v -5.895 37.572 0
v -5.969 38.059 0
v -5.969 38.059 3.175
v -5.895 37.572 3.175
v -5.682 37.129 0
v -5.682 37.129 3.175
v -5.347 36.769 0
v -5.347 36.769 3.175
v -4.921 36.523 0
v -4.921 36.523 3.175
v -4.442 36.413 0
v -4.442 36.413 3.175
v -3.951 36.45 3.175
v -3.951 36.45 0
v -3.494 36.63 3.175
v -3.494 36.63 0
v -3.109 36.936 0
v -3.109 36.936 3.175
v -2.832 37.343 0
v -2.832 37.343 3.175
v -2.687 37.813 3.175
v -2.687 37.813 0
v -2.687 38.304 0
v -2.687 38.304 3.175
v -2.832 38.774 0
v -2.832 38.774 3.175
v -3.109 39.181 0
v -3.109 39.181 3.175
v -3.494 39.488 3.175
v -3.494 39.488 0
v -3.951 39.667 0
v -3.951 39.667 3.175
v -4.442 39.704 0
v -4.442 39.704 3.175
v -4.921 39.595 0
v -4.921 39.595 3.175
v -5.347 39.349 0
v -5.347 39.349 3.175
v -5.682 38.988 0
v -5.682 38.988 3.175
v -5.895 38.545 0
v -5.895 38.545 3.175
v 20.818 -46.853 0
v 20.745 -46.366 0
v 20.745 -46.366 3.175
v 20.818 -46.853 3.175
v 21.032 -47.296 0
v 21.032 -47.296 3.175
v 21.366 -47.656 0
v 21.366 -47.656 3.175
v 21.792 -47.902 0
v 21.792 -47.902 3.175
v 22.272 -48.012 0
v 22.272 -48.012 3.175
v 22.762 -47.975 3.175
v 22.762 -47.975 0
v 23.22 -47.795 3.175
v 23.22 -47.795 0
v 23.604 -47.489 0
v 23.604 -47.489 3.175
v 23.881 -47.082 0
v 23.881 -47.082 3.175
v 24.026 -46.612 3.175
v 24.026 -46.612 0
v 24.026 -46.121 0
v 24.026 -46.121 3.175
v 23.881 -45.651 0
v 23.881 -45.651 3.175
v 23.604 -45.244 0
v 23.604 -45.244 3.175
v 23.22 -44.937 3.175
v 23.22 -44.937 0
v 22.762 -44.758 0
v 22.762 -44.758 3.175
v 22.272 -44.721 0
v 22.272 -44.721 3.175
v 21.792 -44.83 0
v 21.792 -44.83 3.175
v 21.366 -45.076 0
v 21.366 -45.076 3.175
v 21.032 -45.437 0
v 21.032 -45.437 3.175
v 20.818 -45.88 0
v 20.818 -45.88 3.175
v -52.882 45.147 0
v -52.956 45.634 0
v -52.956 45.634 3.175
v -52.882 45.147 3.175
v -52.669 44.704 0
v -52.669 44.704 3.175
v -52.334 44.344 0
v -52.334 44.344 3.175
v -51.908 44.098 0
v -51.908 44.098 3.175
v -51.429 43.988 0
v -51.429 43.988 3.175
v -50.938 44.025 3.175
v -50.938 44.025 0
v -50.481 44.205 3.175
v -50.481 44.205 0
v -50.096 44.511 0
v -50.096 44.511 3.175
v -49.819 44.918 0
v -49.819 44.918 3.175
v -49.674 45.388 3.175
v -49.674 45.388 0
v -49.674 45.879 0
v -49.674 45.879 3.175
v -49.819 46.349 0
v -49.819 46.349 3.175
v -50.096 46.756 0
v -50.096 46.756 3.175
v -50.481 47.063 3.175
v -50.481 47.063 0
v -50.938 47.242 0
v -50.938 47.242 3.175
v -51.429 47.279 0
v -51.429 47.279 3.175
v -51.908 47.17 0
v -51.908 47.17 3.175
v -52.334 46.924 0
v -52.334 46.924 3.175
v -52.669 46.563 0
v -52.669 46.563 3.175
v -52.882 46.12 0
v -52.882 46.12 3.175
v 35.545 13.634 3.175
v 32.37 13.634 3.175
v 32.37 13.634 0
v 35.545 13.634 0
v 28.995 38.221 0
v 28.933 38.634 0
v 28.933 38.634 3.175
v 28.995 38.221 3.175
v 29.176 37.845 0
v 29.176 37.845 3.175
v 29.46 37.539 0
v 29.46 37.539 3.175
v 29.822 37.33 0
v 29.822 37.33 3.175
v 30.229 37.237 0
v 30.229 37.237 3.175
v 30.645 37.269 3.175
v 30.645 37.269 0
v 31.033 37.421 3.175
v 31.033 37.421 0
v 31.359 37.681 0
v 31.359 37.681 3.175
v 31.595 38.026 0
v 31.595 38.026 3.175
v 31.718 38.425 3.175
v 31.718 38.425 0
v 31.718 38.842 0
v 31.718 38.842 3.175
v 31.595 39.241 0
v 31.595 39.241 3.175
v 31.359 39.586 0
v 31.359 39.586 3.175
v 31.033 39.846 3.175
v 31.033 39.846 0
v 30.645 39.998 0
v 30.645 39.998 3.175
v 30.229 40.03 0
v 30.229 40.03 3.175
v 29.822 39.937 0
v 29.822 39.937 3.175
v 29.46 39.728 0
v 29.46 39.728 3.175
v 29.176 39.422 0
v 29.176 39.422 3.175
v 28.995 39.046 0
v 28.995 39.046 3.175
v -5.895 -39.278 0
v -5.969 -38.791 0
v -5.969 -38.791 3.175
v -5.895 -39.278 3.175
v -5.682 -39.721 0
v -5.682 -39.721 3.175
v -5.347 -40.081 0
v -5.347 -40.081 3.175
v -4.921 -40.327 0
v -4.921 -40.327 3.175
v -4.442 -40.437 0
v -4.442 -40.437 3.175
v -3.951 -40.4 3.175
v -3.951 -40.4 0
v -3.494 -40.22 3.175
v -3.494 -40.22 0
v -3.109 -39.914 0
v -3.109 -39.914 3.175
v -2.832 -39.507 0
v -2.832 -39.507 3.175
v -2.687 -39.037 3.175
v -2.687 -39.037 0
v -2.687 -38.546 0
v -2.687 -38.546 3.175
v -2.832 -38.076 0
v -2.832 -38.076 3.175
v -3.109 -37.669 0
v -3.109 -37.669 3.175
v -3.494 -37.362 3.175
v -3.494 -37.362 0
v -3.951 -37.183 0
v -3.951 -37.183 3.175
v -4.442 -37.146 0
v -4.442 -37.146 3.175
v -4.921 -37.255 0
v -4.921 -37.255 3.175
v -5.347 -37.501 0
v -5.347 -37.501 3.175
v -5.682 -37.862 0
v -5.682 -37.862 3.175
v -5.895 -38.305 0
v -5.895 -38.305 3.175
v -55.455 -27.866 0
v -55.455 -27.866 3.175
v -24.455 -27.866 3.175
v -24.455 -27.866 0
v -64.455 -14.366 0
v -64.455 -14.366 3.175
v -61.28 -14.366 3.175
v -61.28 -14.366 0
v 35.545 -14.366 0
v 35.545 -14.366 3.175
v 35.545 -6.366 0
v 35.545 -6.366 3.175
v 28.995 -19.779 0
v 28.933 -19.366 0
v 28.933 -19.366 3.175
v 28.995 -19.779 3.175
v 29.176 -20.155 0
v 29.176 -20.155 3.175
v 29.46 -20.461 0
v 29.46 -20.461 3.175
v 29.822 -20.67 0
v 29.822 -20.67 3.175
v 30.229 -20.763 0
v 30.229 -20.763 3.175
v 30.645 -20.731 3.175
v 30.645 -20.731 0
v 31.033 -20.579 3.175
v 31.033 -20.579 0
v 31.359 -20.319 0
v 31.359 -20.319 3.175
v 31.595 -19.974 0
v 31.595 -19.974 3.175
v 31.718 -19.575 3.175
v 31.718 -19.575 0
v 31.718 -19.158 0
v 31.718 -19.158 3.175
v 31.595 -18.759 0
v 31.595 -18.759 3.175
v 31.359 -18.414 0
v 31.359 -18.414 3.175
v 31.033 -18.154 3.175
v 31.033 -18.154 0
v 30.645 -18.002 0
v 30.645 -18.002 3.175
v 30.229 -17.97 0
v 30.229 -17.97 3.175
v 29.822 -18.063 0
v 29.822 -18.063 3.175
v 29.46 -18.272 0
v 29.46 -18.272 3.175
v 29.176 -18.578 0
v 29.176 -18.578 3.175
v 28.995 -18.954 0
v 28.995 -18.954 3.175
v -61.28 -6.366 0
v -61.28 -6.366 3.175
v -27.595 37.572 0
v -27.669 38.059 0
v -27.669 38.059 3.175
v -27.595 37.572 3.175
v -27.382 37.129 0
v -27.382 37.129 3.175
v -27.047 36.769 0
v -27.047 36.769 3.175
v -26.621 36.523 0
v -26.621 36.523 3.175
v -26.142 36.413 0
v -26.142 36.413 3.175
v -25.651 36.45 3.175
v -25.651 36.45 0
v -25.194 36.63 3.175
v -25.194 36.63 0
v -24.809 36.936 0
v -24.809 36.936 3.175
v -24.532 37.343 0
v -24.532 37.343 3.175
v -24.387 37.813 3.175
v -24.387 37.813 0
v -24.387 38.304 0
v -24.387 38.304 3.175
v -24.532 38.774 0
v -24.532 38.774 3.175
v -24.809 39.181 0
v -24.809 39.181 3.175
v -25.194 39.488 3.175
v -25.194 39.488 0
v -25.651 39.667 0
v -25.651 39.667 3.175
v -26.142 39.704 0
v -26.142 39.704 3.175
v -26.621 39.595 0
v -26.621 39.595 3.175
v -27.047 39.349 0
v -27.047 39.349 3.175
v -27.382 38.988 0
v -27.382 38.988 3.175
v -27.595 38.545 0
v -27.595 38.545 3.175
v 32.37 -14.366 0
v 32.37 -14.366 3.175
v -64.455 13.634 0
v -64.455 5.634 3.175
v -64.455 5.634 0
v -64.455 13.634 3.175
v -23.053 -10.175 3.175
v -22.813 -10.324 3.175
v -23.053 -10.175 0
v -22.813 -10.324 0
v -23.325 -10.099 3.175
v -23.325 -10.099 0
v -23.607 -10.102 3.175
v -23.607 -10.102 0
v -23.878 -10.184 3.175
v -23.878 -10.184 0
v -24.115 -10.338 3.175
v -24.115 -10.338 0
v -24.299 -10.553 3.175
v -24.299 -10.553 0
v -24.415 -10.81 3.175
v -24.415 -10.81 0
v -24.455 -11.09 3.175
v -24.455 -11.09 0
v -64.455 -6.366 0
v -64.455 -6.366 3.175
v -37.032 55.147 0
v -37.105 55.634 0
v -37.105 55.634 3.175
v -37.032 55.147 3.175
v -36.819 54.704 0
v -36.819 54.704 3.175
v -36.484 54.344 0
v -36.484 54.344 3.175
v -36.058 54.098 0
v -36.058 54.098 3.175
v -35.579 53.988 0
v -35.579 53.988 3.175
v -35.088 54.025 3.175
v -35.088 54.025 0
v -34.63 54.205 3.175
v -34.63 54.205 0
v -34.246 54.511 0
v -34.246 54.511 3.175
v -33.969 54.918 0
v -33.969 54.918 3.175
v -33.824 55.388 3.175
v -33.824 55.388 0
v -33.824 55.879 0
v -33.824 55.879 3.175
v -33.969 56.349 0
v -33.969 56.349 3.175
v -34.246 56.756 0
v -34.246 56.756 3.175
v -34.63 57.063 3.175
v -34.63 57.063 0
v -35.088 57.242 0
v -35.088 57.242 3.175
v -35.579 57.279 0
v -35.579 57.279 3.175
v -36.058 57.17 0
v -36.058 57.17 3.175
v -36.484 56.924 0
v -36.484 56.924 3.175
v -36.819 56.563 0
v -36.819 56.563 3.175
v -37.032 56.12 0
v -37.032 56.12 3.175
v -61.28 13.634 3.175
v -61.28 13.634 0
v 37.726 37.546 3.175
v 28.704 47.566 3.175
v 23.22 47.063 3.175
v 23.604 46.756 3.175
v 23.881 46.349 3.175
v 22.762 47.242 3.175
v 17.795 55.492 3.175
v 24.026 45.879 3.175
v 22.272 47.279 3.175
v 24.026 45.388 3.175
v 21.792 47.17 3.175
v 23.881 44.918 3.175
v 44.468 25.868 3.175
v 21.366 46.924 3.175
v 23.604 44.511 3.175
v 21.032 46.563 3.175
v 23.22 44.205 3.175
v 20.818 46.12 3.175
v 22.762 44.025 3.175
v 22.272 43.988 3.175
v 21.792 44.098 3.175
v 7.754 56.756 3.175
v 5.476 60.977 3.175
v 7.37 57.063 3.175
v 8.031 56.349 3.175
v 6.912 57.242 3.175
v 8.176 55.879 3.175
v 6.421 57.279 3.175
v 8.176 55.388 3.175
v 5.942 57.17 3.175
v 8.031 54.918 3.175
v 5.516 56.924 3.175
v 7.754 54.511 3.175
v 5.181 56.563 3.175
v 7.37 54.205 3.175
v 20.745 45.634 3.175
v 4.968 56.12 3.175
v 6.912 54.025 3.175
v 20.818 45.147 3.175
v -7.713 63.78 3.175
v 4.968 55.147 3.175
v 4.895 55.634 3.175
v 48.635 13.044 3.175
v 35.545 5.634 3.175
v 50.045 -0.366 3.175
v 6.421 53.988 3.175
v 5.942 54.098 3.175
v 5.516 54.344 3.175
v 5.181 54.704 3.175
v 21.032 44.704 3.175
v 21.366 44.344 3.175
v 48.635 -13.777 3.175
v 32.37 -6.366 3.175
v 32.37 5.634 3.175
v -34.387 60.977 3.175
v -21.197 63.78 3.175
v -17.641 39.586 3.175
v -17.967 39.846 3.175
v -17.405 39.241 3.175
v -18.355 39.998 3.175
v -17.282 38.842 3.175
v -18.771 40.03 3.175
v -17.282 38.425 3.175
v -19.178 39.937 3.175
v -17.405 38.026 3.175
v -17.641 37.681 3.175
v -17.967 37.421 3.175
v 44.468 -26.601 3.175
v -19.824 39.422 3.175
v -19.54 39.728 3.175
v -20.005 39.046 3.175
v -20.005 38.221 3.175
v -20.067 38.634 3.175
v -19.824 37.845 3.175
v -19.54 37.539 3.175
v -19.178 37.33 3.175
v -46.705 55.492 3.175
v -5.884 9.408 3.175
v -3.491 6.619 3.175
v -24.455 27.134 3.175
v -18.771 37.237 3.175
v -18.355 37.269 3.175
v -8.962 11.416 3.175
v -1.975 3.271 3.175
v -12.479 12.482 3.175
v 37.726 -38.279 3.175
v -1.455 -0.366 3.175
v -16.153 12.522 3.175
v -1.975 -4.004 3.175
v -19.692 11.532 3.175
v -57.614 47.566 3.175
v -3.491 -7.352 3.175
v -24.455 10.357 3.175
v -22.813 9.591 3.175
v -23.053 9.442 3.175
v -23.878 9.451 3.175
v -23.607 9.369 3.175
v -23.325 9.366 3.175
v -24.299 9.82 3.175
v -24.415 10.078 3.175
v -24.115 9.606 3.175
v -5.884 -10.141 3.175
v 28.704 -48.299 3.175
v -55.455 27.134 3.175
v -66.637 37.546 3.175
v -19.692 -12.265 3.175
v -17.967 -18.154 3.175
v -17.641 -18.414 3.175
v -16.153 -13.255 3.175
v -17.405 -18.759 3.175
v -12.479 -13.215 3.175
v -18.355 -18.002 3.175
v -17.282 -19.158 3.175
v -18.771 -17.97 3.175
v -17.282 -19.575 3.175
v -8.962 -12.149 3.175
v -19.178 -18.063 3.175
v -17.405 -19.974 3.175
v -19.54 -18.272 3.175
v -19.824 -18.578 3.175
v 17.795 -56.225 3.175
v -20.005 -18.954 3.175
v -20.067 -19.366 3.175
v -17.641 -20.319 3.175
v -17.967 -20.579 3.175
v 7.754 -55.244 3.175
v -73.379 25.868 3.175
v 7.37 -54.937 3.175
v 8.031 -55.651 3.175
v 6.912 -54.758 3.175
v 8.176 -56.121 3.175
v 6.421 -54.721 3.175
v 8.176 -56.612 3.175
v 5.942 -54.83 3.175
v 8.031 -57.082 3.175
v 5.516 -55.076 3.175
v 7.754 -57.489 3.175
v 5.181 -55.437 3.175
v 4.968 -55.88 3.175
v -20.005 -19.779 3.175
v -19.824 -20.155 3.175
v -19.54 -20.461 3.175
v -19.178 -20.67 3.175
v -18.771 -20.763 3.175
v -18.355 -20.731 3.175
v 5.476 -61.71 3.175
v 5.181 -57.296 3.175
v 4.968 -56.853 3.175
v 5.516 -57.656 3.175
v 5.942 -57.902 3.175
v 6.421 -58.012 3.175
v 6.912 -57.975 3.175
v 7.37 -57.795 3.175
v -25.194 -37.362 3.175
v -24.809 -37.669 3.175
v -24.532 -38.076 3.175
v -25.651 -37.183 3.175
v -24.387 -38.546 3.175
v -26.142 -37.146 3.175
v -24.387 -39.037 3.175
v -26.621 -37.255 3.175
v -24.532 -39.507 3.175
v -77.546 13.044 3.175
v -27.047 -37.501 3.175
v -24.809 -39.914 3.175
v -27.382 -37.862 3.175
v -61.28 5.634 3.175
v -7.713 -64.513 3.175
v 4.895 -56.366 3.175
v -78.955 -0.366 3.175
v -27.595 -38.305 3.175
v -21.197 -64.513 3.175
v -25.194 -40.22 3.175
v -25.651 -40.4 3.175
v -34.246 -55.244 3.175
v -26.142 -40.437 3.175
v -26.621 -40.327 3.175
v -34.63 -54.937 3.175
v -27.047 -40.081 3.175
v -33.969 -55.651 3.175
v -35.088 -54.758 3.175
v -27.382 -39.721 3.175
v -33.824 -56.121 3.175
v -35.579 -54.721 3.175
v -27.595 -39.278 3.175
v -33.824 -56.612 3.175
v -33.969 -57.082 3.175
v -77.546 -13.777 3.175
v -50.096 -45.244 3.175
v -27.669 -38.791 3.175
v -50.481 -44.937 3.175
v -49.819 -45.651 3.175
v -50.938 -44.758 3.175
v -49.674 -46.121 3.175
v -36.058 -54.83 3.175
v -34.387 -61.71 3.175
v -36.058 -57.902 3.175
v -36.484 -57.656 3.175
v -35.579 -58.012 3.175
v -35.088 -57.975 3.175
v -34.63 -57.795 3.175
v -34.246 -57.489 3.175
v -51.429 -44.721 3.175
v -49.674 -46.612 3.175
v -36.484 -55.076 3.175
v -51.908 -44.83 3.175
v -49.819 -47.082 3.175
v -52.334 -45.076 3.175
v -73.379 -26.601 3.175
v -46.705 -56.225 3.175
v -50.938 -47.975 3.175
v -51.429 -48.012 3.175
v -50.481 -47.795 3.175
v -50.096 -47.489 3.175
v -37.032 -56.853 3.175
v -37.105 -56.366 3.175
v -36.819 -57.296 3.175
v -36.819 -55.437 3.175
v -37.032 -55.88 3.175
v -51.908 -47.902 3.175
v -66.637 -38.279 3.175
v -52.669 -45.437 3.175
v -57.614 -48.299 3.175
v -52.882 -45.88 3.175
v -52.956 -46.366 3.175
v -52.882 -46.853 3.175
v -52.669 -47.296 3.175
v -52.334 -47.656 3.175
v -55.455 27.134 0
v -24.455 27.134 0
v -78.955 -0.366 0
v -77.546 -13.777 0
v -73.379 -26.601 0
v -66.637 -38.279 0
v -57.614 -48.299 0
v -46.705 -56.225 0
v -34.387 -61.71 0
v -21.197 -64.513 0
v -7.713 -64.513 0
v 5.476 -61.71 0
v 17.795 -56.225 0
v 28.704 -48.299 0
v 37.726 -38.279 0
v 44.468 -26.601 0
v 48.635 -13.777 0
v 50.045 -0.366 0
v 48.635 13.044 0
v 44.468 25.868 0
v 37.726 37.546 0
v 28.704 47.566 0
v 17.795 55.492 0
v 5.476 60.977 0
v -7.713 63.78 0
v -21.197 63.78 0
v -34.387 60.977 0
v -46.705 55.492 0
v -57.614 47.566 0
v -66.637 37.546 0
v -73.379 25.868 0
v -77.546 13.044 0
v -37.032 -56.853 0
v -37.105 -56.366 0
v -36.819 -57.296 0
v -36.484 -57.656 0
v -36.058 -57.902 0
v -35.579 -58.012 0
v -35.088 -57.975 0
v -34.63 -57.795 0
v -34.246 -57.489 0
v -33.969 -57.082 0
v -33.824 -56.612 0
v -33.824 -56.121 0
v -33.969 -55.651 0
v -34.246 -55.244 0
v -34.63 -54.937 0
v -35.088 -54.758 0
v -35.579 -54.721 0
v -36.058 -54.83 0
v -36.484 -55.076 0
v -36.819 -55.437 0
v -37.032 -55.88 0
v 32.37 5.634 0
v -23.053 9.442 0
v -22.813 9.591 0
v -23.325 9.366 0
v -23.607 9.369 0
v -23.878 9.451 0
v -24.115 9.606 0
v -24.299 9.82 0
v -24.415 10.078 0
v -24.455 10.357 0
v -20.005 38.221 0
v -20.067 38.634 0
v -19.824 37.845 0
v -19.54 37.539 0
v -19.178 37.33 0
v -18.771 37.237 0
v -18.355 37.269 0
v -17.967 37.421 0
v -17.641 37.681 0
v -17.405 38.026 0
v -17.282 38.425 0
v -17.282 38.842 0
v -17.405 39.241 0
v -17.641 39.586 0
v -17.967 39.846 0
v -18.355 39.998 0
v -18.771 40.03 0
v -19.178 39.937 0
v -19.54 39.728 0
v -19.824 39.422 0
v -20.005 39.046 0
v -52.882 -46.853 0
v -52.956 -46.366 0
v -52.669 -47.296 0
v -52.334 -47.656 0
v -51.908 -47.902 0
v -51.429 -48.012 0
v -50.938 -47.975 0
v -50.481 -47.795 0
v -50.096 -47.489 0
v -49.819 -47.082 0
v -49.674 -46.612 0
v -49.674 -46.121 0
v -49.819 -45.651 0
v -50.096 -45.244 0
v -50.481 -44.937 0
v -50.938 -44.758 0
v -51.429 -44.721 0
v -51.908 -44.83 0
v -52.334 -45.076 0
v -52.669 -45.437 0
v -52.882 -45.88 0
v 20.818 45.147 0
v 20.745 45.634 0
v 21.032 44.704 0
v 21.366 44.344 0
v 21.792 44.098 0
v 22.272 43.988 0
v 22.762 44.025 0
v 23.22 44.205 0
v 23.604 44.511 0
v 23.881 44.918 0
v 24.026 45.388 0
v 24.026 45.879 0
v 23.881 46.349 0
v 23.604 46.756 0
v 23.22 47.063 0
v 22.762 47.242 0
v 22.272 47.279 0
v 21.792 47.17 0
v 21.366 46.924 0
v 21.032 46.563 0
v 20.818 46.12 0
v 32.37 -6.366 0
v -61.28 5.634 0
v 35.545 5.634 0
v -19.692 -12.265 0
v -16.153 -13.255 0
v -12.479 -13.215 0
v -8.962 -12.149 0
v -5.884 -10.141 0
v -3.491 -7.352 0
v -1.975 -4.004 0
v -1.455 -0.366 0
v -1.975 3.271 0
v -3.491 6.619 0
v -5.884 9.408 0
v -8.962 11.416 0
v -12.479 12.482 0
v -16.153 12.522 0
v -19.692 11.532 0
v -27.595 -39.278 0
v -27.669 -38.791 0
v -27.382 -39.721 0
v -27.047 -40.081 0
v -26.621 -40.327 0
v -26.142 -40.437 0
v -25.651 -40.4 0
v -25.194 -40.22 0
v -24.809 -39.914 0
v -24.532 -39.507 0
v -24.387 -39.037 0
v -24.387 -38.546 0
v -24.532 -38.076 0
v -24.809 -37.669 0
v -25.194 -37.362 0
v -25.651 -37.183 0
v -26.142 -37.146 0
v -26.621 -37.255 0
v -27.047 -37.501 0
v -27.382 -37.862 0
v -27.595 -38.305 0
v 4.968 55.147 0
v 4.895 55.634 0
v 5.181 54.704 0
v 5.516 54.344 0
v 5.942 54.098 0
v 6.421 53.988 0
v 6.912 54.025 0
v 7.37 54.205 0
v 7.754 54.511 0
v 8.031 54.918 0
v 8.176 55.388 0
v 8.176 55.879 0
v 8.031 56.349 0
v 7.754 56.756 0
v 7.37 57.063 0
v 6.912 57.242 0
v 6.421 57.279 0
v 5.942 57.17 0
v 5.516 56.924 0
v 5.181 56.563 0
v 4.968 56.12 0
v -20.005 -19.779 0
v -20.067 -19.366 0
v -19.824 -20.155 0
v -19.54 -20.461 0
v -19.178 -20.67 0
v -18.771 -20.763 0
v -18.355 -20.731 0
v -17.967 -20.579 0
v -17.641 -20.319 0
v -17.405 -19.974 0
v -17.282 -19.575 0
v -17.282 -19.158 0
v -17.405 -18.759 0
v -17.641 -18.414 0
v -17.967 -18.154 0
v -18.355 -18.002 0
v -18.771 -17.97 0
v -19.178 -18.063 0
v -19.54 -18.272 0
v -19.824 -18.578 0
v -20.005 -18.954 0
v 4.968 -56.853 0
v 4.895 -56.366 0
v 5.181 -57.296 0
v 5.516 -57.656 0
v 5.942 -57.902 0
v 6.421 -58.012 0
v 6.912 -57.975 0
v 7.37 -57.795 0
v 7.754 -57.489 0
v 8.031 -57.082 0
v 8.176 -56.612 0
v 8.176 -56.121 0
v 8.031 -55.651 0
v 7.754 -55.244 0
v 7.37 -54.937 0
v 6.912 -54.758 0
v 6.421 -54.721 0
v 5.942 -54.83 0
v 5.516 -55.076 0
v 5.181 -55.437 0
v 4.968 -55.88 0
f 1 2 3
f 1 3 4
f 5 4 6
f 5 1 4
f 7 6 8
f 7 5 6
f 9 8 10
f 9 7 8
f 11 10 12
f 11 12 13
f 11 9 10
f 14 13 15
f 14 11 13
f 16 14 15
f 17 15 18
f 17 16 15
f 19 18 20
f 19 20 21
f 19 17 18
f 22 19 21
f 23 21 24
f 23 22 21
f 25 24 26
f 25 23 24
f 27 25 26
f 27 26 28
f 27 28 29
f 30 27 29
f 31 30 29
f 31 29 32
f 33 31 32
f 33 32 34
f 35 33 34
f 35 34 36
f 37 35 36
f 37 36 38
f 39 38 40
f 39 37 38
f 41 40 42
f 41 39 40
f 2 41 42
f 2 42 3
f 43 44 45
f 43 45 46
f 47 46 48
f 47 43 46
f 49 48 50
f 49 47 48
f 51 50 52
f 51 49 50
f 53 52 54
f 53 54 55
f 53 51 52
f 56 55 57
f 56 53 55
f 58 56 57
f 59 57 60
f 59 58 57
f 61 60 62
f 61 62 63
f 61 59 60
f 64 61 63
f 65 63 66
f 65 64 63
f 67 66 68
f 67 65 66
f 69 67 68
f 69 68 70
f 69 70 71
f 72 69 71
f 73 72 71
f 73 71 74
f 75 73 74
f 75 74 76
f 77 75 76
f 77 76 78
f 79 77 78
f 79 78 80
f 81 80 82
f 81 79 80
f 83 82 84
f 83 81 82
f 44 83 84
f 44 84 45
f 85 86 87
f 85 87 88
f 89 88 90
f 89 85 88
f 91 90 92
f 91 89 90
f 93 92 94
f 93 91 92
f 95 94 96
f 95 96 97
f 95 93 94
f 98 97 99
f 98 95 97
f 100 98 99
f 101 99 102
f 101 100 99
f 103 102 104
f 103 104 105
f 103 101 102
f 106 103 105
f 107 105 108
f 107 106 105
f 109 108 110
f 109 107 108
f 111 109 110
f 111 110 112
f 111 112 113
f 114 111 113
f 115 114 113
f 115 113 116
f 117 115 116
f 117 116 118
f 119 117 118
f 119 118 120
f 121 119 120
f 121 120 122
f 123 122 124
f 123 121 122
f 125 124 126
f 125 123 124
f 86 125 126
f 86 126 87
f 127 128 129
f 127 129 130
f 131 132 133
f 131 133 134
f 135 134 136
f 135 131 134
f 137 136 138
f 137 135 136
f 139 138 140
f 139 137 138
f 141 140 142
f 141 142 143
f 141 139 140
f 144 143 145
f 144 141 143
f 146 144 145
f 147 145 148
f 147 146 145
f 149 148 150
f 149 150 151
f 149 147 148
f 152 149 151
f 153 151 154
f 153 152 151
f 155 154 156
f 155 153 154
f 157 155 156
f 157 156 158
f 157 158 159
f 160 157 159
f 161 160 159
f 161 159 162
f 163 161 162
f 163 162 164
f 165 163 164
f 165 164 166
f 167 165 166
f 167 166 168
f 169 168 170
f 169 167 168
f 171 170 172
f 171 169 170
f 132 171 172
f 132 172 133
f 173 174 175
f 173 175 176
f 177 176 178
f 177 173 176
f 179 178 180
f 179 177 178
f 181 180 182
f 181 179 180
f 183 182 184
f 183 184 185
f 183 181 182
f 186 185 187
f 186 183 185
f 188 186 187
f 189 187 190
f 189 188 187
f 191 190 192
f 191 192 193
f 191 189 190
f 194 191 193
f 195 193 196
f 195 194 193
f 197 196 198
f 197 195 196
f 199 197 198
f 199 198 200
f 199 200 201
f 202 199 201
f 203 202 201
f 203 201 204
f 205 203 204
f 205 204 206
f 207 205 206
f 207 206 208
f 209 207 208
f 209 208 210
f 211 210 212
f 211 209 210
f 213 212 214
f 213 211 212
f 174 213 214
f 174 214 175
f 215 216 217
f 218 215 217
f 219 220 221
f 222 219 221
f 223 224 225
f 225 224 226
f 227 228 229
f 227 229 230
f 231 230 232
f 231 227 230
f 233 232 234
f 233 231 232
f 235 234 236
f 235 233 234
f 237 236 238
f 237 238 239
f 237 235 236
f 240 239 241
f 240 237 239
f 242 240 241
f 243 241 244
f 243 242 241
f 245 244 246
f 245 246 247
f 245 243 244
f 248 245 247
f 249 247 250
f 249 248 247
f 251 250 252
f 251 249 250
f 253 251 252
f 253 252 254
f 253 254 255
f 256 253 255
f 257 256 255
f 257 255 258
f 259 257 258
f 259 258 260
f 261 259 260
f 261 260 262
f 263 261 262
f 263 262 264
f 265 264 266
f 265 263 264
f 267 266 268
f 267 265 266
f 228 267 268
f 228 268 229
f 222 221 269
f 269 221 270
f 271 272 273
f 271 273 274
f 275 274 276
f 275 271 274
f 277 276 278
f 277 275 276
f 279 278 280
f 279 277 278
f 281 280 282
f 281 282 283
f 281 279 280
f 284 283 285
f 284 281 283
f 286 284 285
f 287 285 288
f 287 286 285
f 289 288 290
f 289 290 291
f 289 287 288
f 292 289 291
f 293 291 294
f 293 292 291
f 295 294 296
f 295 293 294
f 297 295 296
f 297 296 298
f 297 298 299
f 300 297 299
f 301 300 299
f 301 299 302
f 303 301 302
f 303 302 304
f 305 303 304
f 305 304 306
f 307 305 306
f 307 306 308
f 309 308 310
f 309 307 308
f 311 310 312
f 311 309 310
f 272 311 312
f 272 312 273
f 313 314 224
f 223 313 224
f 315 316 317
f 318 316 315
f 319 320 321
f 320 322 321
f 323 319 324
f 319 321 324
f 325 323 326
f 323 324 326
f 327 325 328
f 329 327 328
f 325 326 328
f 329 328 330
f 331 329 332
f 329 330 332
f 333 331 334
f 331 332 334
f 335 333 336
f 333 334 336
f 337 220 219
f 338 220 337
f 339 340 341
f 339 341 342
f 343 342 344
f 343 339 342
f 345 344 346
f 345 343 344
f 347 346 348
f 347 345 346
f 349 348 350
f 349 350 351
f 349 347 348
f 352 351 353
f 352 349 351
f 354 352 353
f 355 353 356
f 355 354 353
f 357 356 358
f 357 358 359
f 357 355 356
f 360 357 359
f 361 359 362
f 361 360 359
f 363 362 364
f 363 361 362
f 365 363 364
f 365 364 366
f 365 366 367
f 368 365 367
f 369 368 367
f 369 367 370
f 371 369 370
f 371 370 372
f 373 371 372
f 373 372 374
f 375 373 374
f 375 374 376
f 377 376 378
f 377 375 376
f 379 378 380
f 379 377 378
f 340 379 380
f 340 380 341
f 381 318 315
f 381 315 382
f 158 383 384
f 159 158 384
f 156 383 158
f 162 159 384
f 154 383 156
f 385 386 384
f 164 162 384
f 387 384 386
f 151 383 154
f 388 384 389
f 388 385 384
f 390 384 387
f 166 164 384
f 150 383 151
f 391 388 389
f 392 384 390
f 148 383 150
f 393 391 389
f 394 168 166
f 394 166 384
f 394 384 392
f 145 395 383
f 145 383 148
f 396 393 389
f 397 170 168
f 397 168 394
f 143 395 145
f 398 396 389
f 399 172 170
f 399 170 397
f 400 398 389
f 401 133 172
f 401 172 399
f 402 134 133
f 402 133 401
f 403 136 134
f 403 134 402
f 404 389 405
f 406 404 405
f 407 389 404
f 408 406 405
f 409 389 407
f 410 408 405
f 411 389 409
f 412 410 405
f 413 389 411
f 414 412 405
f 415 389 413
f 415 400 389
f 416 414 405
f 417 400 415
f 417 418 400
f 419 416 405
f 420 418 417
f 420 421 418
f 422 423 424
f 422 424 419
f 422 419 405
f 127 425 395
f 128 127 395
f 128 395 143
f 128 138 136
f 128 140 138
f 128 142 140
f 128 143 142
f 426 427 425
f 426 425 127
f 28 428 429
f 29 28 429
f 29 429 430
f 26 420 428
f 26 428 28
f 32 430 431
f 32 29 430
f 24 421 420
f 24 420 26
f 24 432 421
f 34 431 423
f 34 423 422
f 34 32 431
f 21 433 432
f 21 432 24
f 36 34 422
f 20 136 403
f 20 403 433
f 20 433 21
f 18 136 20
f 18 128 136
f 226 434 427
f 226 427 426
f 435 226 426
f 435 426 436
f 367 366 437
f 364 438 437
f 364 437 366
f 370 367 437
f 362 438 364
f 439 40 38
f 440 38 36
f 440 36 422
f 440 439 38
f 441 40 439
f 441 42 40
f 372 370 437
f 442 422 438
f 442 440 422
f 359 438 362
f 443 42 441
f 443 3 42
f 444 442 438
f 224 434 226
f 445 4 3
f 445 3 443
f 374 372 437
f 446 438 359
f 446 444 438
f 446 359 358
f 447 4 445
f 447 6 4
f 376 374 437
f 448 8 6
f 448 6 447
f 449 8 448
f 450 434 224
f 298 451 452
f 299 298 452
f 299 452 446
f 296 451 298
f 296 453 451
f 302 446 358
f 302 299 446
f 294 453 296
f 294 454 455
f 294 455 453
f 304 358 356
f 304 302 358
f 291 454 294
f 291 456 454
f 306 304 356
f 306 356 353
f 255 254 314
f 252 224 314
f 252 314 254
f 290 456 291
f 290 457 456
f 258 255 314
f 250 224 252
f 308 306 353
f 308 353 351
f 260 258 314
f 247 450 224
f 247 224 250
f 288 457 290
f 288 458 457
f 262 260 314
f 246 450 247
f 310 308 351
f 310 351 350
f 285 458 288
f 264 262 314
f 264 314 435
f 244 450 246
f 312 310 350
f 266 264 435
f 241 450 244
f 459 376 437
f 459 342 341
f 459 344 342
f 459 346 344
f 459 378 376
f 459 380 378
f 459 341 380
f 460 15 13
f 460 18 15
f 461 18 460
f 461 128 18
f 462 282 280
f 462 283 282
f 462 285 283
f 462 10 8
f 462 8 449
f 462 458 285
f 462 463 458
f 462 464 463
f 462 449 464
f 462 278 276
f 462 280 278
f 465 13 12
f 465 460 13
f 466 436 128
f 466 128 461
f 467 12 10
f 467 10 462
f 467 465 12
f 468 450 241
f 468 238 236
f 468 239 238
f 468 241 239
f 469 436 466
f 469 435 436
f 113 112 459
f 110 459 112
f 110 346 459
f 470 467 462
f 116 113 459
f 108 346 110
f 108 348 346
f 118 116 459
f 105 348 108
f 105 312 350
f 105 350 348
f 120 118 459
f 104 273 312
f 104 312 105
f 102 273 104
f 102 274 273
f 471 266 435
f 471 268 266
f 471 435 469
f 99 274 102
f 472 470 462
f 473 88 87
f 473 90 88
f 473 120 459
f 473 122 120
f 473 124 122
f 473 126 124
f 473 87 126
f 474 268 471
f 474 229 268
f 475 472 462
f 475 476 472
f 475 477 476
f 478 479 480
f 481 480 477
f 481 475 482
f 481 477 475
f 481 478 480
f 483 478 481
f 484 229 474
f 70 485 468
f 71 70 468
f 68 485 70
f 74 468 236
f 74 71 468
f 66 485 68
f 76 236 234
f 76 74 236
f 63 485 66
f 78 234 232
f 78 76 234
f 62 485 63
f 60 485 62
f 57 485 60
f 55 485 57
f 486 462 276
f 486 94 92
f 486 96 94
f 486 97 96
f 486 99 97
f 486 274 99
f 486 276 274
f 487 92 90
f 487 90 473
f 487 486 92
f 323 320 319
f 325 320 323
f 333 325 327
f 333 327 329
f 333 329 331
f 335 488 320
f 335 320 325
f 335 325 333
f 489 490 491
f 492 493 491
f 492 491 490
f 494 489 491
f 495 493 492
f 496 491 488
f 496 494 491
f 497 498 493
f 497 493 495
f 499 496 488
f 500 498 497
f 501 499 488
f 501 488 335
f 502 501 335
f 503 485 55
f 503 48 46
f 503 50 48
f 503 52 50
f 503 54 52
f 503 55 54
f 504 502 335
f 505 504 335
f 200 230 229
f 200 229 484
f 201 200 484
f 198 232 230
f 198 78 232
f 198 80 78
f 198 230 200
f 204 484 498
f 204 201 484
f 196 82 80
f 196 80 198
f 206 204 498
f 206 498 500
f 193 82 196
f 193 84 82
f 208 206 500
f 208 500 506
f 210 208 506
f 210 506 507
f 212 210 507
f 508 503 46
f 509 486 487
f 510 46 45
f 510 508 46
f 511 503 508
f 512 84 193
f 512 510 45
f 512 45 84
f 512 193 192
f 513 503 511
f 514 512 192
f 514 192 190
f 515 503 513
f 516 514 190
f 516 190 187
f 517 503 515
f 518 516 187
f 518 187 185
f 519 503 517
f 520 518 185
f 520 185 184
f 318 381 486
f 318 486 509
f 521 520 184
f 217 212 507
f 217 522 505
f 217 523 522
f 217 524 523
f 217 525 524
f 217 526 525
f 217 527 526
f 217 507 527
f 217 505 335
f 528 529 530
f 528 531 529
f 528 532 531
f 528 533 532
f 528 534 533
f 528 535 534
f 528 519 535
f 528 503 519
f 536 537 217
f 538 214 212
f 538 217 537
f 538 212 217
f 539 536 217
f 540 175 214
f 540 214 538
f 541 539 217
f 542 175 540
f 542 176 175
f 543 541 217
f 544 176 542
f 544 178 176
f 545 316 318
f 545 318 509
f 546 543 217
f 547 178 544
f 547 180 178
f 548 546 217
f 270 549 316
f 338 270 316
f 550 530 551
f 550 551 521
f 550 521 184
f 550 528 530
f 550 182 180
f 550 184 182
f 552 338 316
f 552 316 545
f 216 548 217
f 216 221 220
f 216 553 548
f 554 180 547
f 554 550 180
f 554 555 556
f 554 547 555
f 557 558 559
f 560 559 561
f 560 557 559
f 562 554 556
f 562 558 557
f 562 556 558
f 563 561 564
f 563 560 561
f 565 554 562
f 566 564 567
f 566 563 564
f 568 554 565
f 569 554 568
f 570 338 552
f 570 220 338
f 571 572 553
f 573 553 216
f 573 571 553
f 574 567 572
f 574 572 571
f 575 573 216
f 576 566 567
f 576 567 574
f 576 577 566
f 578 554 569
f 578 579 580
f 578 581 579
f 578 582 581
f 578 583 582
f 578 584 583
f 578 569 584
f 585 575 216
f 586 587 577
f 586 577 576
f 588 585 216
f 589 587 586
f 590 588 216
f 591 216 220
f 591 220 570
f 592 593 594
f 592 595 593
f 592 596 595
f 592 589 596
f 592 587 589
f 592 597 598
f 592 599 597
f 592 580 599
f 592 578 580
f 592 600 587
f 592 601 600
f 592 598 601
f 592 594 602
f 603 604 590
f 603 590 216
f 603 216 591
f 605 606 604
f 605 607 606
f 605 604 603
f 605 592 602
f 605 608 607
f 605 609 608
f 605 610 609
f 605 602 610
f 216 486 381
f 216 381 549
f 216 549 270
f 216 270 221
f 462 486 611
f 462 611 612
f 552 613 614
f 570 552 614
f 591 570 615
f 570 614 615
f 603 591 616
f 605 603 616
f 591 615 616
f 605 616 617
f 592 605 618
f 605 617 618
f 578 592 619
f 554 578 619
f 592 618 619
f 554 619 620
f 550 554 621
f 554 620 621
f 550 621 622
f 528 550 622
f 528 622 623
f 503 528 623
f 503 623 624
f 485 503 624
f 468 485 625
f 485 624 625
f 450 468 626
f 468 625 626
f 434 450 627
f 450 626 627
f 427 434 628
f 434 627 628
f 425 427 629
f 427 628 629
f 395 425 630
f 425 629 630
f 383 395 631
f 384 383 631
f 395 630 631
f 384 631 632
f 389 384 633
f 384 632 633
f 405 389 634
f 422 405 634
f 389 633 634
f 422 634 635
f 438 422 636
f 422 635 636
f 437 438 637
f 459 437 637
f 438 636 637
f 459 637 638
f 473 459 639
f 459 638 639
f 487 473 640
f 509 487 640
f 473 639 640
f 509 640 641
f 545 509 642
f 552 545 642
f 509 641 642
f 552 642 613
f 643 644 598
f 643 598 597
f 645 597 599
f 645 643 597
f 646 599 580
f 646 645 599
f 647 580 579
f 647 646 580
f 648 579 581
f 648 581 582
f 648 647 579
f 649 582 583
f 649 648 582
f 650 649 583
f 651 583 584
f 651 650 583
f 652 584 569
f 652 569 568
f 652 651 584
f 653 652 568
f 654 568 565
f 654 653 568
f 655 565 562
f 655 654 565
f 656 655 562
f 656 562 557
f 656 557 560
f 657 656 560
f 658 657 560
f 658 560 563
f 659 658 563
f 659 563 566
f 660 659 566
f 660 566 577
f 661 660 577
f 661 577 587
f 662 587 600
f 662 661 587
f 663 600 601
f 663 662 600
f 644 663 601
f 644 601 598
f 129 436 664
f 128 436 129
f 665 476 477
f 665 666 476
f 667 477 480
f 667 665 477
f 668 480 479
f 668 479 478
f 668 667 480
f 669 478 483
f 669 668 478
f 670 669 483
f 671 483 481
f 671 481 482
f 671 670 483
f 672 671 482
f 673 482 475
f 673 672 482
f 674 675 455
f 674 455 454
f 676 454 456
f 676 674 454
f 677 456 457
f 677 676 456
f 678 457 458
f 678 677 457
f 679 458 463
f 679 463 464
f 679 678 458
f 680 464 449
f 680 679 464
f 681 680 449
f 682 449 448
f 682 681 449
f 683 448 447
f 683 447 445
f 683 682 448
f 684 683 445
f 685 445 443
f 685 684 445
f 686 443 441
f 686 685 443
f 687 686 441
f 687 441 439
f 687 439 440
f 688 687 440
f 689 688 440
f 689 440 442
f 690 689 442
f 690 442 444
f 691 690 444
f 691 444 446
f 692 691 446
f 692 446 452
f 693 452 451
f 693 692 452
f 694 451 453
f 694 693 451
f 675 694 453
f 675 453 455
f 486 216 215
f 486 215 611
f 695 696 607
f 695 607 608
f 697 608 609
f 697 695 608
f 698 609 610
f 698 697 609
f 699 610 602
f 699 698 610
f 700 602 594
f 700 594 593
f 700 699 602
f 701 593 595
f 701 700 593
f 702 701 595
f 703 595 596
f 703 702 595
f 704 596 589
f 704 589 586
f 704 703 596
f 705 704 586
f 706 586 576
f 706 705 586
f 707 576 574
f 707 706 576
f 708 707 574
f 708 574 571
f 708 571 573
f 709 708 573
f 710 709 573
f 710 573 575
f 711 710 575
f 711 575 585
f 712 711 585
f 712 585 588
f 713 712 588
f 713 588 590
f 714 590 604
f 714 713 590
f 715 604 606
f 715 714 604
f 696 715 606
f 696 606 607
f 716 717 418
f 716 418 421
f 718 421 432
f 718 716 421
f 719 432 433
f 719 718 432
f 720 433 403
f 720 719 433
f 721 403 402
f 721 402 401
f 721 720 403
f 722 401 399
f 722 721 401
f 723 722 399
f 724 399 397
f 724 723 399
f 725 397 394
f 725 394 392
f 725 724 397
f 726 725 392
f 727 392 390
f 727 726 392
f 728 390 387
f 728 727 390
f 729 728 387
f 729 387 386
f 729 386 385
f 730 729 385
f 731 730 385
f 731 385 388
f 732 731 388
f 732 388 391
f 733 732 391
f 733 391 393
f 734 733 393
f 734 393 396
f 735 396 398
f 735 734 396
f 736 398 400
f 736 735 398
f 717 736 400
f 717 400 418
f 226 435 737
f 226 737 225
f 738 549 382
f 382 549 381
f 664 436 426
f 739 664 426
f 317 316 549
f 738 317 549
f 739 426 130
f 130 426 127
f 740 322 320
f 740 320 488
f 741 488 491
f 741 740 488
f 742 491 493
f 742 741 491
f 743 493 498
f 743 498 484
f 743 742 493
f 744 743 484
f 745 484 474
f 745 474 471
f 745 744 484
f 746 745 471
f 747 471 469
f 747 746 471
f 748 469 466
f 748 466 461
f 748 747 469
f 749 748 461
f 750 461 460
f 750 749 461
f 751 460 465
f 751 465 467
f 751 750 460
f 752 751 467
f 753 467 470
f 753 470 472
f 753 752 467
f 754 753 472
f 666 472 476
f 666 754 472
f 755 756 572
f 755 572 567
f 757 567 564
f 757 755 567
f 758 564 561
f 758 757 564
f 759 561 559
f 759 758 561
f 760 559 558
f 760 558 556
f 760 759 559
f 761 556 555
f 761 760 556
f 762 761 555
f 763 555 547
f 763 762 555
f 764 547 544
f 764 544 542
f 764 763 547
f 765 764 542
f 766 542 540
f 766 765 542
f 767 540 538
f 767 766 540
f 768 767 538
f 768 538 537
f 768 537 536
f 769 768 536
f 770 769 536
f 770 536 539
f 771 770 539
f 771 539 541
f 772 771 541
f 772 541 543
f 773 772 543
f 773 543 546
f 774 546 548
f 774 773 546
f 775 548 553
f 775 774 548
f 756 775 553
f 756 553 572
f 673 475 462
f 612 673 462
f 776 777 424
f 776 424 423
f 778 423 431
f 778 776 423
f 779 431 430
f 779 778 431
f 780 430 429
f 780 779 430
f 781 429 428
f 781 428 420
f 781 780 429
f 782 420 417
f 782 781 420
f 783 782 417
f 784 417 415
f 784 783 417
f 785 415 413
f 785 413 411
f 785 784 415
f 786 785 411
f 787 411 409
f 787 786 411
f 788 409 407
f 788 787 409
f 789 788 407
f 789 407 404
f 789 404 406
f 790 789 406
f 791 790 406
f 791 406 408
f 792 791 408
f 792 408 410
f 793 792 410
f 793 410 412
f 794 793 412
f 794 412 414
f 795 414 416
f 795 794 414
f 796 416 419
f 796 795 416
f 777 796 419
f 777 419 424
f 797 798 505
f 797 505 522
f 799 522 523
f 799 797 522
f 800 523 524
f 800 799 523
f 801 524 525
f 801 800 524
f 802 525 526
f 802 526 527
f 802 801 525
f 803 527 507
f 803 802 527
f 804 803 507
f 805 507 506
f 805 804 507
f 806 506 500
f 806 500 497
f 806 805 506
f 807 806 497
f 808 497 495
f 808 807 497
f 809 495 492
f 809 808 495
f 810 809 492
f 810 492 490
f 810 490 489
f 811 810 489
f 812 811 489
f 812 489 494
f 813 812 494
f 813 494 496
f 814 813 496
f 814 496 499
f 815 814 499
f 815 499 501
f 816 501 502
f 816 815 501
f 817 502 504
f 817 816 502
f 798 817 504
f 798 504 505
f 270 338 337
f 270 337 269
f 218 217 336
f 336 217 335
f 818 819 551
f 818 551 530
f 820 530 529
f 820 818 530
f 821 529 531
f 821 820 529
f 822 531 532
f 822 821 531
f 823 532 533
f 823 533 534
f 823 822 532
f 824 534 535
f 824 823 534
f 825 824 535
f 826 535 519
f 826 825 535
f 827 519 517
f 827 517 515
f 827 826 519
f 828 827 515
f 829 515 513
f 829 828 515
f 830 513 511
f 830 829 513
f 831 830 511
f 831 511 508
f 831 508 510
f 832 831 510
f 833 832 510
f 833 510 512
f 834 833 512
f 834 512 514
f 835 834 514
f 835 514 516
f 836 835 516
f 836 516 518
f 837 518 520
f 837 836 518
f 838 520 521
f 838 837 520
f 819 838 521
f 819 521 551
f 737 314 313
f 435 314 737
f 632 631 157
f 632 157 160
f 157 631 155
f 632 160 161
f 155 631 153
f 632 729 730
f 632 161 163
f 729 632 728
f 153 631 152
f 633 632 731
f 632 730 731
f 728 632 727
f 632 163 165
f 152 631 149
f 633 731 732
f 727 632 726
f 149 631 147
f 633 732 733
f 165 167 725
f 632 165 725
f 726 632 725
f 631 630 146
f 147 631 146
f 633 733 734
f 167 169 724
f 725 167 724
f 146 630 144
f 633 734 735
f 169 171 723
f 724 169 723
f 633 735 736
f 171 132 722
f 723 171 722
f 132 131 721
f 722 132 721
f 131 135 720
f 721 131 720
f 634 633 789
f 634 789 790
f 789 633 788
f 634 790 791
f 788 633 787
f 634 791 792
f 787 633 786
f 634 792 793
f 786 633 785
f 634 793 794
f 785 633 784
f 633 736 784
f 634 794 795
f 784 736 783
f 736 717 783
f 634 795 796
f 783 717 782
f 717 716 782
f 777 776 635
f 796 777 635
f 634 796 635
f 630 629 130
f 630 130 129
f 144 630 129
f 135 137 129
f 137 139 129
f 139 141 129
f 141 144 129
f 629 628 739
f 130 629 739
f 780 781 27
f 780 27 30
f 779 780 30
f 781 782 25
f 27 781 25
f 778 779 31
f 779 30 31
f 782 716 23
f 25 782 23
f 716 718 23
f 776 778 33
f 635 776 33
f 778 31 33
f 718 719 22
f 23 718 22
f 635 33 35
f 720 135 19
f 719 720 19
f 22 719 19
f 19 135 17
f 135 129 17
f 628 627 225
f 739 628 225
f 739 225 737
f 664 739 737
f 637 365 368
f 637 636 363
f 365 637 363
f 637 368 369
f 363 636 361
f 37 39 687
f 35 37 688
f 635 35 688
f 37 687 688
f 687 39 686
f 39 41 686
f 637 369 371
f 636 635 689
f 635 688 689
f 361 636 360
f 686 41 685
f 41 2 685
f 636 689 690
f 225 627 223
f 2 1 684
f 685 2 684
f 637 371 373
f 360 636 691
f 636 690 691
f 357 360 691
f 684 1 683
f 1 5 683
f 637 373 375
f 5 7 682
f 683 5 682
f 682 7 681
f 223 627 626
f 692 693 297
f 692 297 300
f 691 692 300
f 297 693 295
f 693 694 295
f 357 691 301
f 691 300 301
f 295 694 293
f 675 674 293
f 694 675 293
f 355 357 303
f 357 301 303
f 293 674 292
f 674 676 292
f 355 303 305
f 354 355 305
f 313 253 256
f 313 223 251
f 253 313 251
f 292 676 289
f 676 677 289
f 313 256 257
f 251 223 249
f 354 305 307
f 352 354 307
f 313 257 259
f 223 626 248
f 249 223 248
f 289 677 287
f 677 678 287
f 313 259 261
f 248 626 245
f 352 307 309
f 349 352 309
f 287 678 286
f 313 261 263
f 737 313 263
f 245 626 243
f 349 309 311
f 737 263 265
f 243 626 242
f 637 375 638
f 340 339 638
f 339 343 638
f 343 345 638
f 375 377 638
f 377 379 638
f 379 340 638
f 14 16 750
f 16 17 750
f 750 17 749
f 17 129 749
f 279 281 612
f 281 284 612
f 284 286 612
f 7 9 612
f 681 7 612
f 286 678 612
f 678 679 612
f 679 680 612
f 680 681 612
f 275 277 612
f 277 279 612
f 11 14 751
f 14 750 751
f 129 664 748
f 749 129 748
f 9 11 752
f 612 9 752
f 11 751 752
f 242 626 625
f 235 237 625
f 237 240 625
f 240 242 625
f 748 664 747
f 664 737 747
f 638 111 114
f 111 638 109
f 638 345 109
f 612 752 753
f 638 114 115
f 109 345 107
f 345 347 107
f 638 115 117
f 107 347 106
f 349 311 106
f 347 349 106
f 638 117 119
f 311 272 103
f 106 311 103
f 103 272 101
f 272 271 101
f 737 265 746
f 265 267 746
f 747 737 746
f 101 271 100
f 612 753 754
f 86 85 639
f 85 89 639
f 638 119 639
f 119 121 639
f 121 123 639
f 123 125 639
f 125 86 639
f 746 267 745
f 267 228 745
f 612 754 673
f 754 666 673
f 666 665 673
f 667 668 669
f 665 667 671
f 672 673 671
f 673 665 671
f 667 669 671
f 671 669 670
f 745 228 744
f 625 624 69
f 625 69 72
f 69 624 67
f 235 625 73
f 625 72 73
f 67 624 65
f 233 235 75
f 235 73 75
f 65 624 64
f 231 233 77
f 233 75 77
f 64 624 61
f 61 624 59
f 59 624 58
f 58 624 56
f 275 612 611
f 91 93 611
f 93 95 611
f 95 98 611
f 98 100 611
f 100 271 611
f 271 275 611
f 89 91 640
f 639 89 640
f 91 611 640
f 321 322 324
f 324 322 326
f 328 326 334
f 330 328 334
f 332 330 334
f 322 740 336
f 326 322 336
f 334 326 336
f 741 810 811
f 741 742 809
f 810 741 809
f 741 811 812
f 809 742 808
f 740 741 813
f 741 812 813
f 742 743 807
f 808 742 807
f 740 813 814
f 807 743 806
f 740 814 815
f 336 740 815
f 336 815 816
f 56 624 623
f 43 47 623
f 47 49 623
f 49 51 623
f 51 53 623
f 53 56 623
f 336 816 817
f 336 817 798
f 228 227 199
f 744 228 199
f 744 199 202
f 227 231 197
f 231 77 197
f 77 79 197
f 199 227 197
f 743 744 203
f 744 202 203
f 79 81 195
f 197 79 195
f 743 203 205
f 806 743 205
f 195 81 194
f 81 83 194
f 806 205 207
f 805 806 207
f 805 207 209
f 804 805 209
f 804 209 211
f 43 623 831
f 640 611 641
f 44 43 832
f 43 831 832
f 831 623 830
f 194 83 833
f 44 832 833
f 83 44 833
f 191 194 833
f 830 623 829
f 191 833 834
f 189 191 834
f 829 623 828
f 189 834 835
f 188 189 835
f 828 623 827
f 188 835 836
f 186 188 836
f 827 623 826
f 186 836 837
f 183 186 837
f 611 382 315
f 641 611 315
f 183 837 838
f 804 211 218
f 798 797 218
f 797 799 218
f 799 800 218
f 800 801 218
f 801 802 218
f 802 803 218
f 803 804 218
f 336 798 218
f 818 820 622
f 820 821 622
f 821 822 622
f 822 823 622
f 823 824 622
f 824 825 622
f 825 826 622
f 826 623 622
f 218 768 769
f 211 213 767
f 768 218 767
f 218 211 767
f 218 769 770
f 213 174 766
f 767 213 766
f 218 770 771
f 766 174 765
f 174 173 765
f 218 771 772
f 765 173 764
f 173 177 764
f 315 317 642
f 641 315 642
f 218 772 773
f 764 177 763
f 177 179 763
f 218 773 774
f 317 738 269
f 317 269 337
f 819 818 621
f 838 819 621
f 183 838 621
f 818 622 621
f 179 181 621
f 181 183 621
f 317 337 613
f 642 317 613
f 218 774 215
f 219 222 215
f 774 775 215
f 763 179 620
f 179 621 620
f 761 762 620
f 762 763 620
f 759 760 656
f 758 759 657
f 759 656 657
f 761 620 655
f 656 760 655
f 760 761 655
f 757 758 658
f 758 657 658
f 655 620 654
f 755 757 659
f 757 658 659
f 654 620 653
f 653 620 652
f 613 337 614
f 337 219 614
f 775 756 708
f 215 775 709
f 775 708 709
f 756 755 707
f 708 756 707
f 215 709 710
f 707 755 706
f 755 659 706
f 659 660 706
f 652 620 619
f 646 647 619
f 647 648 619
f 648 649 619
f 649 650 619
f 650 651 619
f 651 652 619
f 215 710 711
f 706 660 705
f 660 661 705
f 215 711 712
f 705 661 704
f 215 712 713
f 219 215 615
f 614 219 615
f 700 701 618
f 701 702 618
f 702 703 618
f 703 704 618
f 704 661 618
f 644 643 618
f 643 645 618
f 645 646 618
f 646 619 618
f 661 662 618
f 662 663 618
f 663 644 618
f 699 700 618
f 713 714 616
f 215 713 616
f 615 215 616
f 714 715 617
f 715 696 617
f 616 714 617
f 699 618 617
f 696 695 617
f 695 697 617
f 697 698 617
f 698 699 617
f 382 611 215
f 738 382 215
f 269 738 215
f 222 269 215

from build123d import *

# Parameters (mm, degrees)
SKETCH1_R           = 64.5
SKETCH1_R_2         = 1.65
SKETCH1_R_3         = 13
SKETCH1_R_4         = 1.4
BOSS_EXTRUDE2_DEPTH = 3.175
SKETCH2_W           = 3.175
SKETCH2_H           = 8
CUT_EXTRUDE1_DEPTH  = 4.175
SKETCH3_W           = 31
SKETCH3_H           = 55
CUT_EXTRUDE2_DEPTH  = 4.175
FILLET3_R           = 1


with BuildPart() as part:
    # Sketch1 → Boss-Extrude2 (new body)
    with BuildSketch(Plane(origin=(0, 0, 0), x_dir=(-1, 0, 0), z_dir=(0, 0, 1))):
        with Locations((14.45539036, 0.366425758)):
            Circle(SKETCH1_R)
        with Locations((26.018596538, -38.058574242)):
            Circle(SKETCH1_R_2, mode=Mode.SUBTRACT)
        with Locations((4.318596538, -38.058574242)):
            Circle(SKETCH1_R_2, mode=Mode.SUBTRACT)
        with Locations((26.018596538, 38.791425758)):
            Circle(SKETCH1_R_2, mode=Mode.SUBTRACT)
        with Locations((4.318596538, 38.791425758)):
            Circle(SKETCH1_R_2, mode=Mode.SUBTRACT)
        with Locations((14.45539036, 0.366425758)):
            Circle(SKETCH1_R_3, mode=Mode.SUBTRACT)
        with Locations((-6.54460964, 56.366425758)):
            Circle(SKETCH1_R_2, mode=Mode.SUBTRACT)
        with Locations((-22.394874657, 46.366425758)):
            Circle(SKETCH1_R_2, mode=Mode.SUBTRACT)
        with Locations((35.45539036, 56.366425758)):
            Circle(SKETCH1_R_2, mode=Mode.SUBTRACT)
        with Locations((51.305655378, 46.366425758)):
            Circle(SKETCH1_R_2, mode=Mode.SUBTRACT)
        with Locations((51.305655378, -45.633574242)):
            Circle(SKETCH1_R_2, mode=Mode.SUBTRACT)
        with Locations((35.45539036, -55.633574242)):
            Circle(SKETCH1_R_2, mode=Mode.SUBTRACT)
        with Locations((-6.54460964, -55.633574242)):
            Circle(SKETCH1_R_2, mode=Mode.SUBTRACT)
        with Locations((-22.394874657, -45.633574242)):
            Circle(SKETCH1_R_2, mode=Mode.SUBTRACT)
        with Locations((18.66683861, -38.633574242)):
            Circle(SKETCH1_R_4, mode=Mode.SUBTRACT)
        with Locations((-30.33316139, -38.633574242)):
            Circle(SKETCH1_R_4, mode=Mode.SUBTRACT)
        with Locations((18.66683861, 19.366425758)):
            Circle(SKETCH1_R_4, mode=Mode.SUBTRACT)
        with Locations((-30.33316139, 19.366425758)):
            Circle(SKETCH1_R_4, mode=Mode.SUBTRACT)
    extrude(amount=BOSS_EXTRUDE2_DEPTH)

    # Sketch2 → Cut-Extrude1 (cut, through all)
    with BuildSketch(Plane.XY.offset(3.175)):
        with Locations((33.95710964, -10.366425758)):
            Rectangle(SKETCH2_W, SKETCH2_H)
        with Locations((33.95710964, 9.633574242)):
            Rectangle(SKETCH2_W, SKETCH2_H)
        with Locations((-62.86789036, 9.633574242)):
            Rectangle(SKETCH2_W, SKETCH2_H)
        with Locations((-62.86789036, -10.366425758)):
            Rectangle(SKETCH2_W, SKETCH2_H)
    extrude(amount=-CUT_EXTRUDE1_DEPTH, mode=Mode.SUBTRACT)

    # Sketch3 → Cut-Extrude2 (cut, through all)
    with BuildSketch(Plane.XY.offset(3.175)):
        with Locations((-39.95539036, -0.366425758)):
            Rectangle(SKETCH3_W, SKETCH3_H)
    extrude(amount=-CUT_EXTRUDE2_DEPTH, mode=Mode.SUBTRACT)

    # Fillet3
    fillet3_edges = [part.edges().sort_by_distance(p)[0] for p in [
        (-24.45539036, 7.940198105, 1.5875),
        (-24.45539036, -8.673049621, 1.5875),
    ]]
    fillet(fillet3_edges, radius=FILLET3_R)


solid = part.part
